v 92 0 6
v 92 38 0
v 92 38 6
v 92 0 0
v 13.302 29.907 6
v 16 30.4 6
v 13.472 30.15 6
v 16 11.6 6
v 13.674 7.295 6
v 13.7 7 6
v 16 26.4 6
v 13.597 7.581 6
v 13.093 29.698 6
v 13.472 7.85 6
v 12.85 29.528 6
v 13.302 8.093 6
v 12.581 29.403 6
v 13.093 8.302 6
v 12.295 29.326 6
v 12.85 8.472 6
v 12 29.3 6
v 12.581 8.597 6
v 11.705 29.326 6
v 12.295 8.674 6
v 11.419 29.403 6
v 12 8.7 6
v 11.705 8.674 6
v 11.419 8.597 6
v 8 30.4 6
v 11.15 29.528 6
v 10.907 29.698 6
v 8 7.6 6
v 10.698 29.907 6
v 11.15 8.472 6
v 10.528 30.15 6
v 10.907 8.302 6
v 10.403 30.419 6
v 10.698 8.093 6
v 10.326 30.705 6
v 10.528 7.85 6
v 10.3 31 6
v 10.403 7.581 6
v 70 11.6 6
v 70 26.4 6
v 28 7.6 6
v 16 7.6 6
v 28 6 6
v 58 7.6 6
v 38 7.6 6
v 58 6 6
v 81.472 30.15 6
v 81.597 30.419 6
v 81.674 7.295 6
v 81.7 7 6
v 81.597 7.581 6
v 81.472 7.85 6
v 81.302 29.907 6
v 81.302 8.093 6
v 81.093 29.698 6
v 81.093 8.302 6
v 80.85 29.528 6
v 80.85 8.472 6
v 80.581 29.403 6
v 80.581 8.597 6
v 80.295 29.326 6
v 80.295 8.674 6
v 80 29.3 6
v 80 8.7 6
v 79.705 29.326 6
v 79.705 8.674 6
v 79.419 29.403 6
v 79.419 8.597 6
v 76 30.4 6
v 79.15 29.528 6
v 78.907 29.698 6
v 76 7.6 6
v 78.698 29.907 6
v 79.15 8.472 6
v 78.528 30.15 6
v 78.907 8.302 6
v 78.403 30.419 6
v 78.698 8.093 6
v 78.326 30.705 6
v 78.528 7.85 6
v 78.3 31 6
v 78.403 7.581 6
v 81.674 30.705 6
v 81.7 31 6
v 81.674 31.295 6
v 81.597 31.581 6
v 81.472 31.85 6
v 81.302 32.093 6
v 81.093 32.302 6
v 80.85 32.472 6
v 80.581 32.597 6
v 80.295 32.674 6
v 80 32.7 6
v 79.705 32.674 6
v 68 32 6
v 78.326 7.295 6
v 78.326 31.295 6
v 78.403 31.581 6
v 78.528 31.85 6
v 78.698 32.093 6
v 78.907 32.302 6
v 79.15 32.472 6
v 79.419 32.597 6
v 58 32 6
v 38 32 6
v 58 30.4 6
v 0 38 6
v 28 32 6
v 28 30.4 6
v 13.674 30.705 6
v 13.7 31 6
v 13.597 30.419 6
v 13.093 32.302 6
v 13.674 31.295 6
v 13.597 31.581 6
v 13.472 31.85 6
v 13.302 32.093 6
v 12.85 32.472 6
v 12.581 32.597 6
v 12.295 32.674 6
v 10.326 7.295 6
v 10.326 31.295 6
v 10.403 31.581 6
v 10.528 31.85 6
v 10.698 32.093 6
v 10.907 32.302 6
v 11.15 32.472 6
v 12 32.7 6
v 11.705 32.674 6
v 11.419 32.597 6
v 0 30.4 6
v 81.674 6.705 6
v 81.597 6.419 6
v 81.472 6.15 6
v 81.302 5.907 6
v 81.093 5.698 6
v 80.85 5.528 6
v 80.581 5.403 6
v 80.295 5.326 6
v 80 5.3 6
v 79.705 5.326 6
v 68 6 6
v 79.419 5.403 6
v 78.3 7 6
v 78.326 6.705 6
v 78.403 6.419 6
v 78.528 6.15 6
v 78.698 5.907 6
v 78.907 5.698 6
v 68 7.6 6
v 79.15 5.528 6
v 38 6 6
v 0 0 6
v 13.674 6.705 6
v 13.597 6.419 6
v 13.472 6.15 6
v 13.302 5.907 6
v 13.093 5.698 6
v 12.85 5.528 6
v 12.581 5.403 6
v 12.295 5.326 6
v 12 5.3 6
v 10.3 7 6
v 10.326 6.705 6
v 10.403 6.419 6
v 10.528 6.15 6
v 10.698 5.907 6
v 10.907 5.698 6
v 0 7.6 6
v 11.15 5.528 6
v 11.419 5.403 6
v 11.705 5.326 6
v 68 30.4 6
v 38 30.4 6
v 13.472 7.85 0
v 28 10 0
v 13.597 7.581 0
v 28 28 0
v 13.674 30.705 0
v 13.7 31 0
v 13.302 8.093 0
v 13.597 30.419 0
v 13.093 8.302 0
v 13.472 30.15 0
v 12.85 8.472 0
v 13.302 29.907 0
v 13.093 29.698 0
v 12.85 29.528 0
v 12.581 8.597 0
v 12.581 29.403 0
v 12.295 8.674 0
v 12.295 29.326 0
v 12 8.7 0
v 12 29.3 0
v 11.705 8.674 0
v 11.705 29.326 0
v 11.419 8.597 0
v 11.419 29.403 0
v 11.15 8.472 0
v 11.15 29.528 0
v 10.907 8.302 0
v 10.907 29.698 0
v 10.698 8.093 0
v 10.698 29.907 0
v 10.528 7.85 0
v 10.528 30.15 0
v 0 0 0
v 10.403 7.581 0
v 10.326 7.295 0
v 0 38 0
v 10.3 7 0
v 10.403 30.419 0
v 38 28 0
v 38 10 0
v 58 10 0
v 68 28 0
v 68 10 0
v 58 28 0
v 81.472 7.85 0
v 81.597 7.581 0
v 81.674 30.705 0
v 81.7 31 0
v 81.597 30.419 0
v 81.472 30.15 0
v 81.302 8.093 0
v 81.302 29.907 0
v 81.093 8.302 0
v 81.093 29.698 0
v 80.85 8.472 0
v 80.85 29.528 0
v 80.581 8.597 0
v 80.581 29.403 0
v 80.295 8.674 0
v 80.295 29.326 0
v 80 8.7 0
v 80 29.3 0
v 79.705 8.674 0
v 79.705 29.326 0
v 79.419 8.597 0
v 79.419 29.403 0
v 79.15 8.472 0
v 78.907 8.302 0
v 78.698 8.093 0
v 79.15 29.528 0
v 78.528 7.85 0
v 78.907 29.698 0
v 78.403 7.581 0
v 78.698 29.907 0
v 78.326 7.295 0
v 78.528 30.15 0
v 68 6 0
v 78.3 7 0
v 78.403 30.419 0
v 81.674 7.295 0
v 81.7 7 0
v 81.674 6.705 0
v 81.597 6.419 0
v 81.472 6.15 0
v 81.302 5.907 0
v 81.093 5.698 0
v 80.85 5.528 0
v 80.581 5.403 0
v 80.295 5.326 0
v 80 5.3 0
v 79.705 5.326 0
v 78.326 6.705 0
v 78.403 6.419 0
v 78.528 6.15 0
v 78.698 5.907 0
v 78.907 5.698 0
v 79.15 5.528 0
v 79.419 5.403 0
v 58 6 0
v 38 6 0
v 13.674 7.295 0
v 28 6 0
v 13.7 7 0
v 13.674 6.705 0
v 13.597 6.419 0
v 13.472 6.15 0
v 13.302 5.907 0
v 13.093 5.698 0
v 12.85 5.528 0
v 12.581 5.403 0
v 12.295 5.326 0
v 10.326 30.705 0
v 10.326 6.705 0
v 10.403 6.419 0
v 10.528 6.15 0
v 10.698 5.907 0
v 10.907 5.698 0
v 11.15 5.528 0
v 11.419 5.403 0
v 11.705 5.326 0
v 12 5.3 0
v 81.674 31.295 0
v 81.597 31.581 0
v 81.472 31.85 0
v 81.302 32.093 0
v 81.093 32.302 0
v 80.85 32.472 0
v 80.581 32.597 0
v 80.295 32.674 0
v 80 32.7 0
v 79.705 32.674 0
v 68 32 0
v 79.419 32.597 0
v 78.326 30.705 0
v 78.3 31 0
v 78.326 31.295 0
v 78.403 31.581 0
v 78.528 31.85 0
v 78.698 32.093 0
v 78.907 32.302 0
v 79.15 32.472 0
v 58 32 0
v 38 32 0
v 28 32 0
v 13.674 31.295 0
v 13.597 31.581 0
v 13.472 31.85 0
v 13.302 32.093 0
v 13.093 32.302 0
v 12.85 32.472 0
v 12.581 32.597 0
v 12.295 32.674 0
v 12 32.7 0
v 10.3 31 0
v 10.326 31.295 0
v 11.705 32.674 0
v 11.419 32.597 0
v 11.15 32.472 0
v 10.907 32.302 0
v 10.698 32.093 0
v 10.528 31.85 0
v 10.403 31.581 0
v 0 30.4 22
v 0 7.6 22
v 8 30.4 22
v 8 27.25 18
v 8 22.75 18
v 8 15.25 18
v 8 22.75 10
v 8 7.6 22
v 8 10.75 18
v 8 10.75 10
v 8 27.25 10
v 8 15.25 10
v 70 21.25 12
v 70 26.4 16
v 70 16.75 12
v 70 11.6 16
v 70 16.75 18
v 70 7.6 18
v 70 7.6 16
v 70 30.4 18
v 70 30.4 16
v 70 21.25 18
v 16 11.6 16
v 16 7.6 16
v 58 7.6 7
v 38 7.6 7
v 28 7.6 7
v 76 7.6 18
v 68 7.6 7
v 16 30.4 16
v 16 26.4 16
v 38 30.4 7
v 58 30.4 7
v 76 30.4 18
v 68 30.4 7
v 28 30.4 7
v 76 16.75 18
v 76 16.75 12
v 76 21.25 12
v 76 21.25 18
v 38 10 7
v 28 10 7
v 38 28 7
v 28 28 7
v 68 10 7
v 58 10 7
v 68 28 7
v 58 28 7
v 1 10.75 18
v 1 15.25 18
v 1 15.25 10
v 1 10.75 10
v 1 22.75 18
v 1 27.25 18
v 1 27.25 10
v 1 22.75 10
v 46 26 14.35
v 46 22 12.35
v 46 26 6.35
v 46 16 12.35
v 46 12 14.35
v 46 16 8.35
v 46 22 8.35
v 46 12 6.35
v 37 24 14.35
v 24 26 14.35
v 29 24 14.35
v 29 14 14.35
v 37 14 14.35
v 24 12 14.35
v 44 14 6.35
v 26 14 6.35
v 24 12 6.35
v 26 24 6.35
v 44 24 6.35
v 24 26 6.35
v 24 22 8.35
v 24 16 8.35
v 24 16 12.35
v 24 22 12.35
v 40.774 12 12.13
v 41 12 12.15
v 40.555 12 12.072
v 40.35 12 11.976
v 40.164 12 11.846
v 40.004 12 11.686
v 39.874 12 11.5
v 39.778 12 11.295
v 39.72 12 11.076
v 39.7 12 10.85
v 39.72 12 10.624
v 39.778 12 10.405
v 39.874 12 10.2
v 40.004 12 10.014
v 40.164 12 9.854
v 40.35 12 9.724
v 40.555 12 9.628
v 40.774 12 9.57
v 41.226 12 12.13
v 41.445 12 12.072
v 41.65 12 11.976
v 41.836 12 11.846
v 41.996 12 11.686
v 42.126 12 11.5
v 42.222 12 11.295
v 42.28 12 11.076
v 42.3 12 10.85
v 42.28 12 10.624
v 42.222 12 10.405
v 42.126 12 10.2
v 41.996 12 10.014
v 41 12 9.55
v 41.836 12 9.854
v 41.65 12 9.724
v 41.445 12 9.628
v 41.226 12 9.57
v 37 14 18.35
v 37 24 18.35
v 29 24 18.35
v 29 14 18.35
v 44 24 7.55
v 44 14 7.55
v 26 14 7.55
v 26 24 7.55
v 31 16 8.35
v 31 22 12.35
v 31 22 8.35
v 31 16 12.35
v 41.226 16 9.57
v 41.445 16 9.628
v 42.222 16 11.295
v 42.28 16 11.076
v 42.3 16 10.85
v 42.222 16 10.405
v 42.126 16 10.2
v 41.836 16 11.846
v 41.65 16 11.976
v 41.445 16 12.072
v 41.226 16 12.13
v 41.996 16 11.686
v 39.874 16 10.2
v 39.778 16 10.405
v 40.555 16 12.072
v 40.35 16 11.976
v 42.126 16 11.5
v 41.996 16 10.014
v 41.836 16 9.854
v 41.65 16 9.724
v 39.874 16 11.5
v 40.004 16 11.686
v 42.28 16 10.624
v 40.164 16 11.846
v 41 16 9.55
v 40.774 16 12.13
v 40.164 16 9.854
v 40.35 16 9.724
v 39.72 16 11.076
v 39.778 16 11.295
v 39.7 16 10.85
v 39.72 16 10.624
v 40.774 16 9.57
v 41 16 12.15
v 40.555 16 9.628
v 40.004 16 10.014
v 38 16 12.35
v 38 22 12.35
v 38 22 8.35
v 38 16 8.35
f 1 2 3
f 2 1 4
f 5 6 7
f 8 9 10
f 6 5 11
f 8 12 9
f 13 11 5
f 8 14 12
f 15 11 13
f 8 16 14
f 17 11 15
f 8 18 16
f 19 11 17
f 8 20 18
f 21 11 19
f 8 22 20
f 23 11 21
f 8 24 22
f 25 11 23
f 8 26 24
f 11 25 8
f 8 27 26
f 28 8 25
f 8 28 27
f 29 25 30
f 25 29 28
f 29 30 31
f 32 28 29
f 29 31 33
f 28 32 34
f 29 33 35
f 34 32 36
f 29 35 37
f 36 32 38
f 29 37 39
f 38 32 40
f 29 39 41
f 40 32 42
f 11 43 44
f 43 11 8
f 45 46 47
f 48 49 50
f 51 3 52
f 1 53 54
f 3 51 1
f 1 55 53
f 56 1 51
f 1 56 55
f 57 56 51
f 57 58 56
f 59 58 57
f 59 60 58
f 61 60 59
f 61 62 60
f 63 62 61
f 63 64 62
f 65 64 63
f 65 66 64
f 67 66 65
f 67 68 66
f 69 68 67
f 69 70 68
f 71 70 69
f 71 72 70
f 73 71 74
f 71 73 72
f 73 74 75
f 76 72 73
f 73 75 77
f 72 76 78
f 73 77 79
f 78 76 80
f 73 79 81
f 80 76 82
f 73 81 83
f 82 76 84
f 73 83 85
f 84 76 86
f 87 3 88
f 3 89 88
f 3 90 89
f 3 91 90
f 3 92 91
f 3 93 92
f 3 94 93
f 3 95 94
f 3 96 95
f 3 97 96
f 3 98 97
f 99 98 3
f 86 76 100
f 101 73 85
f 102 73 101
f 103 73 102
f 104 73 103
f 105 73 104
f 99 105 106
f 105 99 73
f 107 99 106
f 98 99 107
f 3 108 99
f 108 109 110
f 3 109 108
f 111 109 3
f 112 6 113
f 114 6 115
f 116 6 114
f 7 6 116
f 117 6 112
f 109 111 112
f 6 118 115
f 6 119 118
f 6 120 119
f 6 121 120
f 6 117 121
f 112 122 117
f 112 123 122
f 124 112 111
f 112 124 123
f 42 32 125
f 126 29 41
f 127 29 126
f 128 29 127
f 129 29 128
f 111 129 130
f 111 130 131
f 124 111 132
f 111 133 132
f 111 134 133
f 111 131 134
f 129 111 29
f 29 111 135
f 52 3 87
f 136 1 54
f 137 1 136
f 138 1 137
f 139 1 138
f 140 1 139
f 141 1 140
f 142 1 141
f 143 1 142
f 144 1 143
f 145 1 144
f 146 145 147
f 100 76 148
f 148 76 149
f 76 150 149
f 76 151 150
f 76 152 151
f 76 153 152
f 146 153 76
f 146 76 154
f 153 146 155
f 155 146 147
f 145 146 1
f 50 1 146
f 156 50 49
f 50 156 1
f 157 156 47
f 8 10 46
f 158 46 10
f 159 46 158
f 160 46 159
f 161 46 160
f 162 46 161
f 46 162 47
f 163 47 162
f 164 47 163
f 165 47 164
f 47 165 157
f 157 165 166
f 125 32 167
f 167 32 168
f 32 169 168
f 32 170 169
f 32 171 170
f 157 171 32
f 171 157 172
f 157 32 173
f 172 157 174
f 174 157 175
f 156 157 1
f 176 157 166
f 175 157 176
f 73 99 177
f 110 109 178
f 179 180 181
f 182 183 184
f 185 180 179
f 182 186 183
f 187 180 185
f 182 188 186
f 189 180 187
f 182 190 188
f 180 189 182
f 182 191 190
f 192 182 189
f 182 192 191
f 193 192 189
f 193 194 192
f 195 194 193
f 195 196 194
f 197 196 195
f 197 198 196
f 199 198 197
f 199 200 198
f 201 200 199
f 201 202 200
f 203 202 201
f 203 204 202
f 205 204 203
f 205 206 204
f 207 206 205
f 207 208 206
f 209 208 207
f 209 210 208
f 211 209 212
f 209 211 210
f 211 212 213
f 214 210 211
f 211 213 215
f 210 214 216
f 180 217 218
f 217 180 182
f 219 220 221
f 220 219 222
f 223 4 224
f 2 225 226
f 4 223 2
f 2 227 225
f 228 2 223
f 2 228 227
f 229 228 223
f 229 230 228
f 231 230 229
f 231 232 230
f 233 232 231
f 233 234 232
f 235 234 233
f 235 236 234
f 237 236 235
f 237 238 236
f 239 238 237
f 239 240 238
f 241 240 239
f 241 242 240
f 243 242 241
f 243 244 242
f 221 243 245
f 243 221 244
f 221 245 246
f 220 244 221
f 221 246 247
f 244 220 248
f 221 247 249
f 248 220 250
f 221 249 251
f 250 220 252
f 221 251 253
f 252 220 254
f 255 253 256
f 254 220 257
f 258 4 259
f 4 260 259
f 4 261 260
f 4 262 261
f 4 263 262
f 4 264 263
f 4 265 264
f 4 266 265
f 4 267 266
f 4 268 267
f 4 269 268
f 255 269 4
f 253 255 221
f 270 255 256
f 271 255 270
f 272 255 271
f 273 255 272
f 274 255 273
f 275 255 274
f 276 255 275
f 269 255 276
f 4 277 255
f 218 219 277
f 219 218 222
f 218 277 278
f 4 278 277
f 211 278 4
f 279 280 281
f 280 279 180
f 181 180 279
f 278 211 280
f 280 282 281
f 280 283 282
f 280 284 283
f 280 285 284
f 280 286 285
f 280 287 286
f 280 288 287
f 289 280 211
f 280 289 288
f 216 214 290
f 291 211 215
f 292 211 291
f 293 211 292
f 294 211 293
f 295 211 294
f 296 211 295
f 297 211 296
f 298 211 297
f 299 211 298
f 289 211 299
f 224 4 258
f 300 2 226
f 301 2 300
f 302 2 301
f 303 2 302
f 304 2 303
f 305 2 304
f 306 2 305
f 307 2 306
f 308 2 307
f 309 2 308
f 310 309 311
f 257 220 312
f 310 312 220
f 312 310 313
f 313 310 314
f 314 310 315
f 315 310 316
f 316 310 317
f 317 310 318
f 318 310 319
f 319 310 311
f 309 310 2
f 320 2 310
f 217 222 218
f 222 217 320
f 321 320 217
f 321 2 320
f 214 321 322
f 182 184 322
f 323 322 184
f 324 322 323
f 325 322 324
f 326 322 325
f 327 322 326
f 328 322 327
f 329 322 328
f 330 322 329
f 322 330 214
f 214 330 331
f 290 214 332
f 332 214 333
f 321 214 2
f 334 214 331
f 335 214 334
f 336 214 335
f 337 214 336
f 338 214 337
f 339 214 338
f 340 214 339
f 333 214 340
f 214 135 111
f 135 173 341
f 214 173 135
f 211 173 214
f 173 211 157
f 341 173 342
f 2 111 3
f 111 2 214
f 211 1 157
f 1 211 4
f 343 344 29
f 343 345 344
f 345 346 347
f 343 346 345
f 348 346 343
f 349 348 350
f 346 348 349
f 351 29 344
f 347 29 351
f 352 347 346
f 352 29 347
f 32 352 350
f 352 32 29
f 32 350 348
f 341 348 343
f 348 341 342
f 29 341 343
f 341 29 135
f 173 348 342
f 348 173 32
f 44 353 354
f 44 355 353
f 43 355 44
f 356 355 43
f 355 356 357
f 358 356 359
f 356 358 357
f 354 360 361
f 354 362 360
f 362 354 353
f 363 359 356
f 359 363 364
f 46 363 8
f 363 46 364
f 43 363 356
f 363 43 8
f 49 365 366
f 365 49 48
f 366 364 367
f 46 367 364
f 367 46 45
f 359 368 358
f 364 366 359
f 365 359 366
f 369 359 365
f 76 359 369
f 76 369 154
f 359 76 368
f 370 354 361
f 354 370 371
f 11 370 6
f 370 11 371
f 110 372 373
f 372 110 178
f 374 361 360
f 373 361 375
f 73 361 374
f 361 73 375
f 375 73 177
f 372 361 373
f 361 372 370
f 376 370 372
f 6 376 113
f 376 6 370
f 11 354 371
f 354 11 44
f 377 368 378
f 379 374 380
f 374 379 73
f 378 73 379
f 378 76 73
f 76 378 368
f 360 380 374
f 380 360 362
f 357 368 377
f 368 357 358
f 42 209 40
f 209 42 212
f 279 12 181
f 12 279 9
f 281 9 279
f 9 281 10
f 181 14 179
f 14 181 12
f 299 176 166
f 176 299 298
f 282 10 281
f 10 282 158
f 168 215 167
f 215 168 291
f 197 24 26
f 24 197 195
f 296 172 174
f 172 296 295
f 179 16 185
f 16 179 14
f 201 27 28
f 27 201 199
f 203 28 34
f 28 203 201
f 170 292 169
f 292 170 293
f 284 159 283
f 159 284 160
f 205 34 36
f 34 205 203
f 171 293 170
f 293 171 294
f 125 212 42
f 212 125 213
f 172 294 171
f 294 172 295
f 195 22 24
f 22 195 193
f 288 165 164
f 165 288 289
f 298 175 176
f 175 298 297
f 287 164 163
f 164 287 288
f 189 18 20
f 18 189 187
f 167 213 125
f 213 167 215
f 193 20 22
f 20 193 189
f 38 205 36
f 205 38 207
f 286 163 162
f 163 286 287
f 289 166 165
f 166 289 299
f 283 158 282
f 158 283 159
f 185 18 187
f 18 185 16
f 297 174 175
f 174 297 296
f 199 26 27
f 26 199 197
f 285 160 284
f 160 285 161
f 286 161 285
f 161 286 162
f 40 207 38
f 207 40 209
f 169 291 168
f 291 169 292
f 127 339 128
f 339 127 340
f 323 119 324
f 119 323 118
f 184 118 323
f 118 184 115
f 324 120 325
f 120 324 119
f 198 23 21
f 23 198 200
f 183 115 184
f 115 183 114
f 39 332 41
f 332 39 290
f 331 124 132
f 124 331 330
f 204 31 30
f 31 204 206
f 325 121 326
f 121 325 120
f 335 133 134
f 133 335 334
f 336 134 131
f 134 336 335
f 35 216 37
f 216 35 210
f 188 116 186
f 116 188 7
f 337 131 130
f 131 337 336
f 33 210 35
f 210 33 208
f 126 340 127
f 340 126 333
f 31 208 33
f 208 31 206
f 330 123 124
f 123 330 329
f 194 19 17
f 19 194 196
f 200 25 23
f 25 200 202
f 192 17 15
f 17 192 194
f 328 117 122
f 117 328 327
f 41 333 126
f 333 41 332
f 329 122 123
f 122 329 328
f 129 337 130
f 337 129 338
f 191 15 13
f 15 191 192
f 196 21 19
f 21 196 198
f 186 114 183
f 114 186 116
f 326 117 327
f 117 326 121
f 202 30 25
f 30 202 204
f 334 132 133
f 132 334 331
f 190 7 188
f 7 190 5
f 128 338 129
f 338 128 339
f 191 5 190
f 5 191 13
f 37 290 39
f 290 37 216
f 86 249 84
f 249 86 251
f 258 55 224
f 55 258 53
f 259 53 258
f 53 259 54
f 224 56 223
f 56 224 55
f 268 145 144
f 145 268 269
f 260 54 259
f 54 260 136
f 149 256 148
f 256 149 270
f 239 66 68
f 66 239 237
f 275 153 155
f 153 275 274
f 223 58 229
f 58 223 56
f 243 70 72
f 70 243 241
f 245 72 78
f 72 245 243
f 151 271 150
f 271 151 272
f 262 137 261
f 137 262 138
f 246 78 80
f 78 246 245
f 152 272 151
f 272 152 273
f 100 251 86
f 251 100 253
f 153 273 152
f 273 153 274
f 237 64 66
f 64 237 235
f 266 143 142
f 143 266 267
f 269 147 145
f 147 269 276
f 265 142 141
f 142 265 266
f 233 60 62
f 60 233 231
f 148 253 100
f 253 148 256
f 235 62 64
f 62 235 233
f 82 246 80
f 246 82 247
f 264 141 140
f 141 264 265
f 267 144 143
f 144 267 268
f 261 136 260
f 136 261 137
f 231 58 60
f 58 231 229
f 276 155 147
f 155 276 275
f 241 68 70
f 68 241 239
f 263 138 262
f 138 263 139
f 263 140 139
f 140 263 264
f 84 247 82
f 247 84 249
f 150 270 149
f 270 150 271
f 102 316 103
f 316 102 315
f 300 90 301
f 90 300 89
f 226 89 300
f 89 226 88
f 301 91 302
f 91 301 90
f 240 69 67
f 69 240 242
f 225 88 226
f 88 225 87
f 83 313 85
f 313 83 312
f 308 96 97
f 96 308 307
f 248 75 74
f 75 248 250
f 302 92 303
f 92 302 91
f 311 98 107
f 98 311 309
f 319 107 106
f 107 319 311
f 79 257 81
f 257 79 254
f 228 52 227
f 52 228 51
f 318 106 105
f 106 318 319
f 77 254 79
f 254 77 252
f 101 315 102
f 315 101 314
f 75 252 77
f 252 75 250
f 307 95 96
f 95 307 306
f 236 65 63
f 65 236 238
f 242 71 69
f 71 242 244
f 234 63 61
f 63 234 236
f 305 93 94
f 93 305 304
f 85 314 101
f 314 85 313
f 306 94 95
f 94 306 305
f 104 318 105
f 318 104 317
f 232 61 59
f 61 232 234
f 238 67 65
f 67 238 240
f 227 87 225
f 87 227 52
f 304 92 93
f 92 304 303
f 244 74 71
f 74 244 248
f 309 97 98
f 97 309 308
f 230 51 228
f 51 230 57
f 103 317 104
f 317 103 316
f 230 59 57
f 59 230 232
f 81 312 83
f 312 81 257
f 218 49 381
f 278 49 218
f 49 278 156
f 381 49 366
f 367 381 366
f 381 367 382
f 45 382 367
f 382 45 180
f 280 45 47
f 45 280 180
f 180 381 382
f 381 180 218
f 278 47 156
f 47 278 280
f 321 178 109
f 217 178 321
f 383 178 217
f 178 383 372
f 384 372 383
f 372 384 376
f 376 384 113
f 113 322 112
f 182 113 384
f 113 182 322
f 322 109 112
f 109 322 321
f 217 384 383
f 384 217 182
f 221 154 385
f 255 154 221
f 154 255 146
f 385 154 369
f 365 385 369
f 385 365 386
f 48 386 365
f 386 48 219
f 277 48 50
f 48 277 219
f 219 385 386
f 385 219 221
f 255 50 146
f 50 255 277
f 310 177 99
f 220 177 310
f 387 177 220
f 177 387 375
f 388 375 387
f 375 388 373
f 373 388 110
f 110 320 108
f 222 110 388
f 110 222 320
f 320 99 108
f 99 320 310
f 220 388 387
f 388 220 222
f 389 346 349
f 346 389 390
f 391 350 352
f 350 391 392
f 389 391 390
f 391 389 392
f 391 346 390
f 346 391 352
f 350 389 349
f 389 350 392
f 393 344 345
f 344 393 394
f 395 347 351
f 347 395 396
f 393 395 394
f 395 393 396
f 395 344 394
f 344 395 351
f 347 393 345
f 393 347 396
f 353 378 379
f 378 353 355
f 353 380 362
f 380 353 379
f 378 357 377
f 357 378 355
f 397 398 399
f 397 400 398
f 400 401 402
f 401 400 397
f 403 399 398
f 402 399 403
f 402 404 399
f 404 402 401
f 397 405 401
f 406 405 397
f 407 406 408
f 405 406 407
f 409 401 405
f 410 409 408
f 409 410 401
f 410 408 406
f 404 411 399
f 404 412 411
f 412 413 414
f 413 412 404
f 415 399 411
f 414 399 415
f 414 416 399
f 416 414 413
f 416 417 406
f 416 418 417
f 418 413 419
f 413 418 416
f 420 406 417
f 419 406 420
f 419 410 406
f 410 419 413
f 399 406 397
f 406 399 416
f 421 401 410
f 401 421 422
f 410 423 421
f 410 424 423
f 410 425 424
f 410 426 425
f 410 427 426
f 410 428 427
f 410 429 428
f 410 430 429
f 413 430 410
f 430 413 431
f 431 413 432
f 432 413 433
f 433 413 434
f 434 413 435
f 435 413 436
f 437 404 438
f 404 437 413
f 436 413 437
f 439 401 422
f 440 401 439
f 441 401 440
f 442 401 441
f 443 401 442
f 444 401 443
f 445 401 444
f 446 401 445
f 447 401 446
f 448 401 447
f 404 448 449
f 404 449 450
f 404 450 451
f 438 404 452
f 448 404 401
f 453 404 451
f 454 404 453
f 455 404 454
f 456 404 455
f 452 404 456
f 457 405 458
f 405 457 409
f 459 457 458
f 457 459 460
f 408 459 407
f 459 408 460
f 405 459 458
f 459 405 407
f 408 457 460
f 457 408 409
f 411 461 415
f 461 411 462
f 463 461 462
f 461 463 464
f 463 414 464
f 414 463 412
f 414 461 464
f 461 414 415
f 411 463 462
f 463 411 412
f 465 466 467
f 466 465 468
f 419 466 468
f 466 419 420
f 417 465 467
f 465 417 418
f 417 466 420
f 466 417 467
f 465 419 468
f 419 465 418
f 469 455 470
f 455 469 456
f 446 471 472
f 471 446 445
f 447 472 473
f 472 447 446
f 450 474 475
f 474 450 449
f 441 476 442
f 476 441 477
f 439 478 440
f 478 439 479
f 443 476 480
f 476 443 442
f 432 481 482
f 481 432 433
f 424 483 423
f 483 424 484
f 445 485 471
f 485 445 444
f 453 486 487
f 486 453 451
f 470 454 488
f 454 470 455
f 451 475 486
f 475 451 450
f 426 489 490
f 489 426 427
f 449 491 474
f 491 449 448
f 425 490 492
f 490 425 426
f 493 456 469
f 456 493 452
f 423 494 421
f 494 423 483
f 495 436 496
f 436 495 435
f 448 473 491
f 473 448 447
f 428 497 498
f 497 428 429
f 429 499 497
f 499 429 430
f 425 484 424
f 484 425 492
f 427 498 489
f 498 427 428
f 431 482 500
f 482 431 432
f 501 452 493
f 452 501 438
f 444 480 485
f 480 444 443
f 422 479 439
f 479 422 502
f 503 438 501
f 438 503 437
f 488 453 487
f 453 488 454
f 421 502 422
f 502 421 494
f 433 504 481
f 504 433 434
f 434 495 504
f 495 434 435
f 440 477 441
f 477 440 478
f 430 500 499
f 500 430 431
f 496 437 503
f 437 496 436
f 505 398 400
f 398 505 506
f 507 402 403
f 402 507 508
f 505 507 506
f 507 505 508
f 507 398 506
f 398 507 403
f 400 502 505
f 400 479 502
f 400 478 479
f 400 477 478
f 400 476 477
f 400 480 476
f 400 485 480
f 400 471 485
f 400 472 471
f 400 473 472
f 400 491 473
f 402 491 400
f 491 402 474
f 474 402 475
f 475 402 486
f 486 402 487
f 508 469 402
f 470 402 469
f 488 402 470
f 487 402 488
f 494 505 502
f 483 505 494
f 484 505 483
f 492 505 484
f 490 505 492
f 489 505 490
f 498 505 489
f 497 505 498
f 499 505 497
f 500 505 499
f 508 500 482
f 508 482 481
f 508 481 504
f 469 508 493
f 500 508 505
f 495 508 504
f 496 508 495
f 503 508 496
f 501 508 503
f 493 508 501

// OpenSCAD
/*
Bench mechanism v3

Purpose:
- smaller and cheaper than v2
- safer and simpler than a wearable shell
- built for a library or print-shop first run
- designed around M3 hardware and elastic-band testing

Part selector:
- part = 0 -> assembly preview
- part = 1 -> base
- part = 2 -> carriage
- part = 3 -> M3 test block
*/

$fn = 36;

part = 0;
eps = 0.05;

// --- Hardware baseline ------------------------------------------------------
// M3 clearance hole for screws that should pass through without tapping.
m3_clearance_d = 3.4;
// M3 insert bore for optional heat-set inserts in a future shell or fixture.
m3_insert_bore_d = 4.6;
// Across-flats dimension for a standard M3 hex nut trap.
m3_nut_flat = 5.7;
// Nut trap depth for a standard M3 nut.
m3_nut_depth = 2.6;

// --- Print / fit tuning -----------------------------------------------------
// Side clearance per rail face. Generous for cheap PLA service prints.
side_clearance = 0.40;
// Vertical clearance keeps the carriage from scraping the base immediately.
vertical_clearance = 0.35;

// --- Base dimensions --------------------------------------------------------
// Overall base length kept under 100 mm to stay cheap at a print shop.
base_length = 92;
// Overall base width kept narrow but still wide enough for stable taping.
base_width = 38;
// Flat plate thickness for stiffness without wasting plastic.
base_thickness = 6;

// Rail run starts after the rear bridge so the carriage has a hard back stop.
rail_start = 16;
// Rail length is short on purpose to limit print size and travel distance.
rail_length = 54;
// Rail thickness is chunky enough to survive repeated beginner handling.
rail_thickness = 4;
// Rail height is tall enough to guide the carriage without toppling.
rail_height = 10;

// Carriage width is the moving body width before clearances are added.
carriage_width = 14;
// Channel width is the free space between rails.
channel_width = carriage_width + side_clearance * 2;
// Outer guide span includes both rails.
function guide_outer_width() = channel_width + rail_thickness * 2;

// Rear bridge creates the back stop and elastic anchor wall.
rear_bridge_length = 8;
rear_bridge_height = 16;
// Elastic slots fit common office rubber bands or light elastic cord.
elastic_slot_w = 4.5;
elastic_slot_h = 8;
elastic_slot_spacing = 12;

// Front stop limits travel and keeps the tether centered.
front_stop_length = 6;
front_stop_height = 12;
// Open notch is intentionally top-open to avoid closed-hole manifold issues.
front_notch_w = 4.5;
front_notch_d = 6;

// M3 mounting holes let the base screw onto scrap wood or plastic if needed.
mount_hole_offset_x = 12;
mount_hole_offset_y = 7;

// Tie-down slots are backup mounting points for tape or zip ties.
tie_slot_len = 10;
tie_slot_w = 4;

// --- Carriage dimensions ----------------------------------------------------
// Carriage is short to keep mass low and elastic response predictable.
carriage_length = 22;
// Carriage body height before finger tab.
carriage_height = 8;
// Bottom relief reduces contact area and friction on cheap prints.
carriage_relief_depth = 1.2;
// Rear slot captures the elastic loop or tied cord.
carriage_elastic_slot_len = 7;
carriage_elastic_slot_w = 6;
carriage_elastic_slot_h = 4;
// Front tether hole for line or string attachment.
tether_hole_d = 2.6;
// Front soft-tip pocket gives tape or foam a repeatable landing spot.
tip_slot_len = 8;
tip_slot_w = 6;
tip_slot_h = 4;

module m3_hole(h) {
    cylinder(h = h, d = m3_clearance_d);
}

module hex_nut_cut(depth) {
    cylinder(h = depth, d = m3_nut_flat / 0.8660254, $fn = 6);
}

module base_module() {
    difference() {
        union() {
            cube([base_length, base_width, base_thickness]);

            // Rear bridge is the hard back stop and elastic anchor structure.
            translate([0, (base_width - guide_outer_width()) / 2, base_thickness - eps])
                cube([rear_bridge_length, guide_outer_width(), rear_bridge_height + eps]);

            // Left rail guides the carriage and overlaps the plate slightly.
            translate([rail_start, (base_width - guide_outer_width()) / 2, base_thickness - eps])
                cube([rail_length, rail_thickness, rail_height + eps]);

            // Right rail mirrors the left rail with the same overlap trick.
            translate([rail_start, (base_width + channel_width) / 2, base_thickness - eps])
                cube([rail_length, rail_thickness, rail_height + eps]);

            // Front stop is a simple rectangular bumper to avoid fragile tips.
            translate([rail_start + rail_length, (base_width - guide_outer_width()) / 2, base_thickness - eps])
                cube([front_stop_length, guide_outer_width(), front_stop_height + eps]);
        }

        // M3 mounting holes for a rigid test fixture.
        translate([mount_hole_offset_x, mount_hole_offset_y, -1]) m3_hole(base_thickness + 2);
        translate([mount_hole_offset_x, base_width - mount_hole_offset_y, -1]) m3_hole(base_thickness + 2);
        translate([base_length - mount_hole_offset_x, mount_hole_offset_y, -1]) m3_hole(base_thickness + 2);
        translate([base_length - mount_hole_offset_x, base_width - mount_hole_offset_y, -1]) m3_hole(base_thickness + 2);

        // Tie slots let you mount the base even if you have zero screws on day one.
        translate([28, 6, -1]) cube([tie_slot_len, tie_slot_w, base_thickness + 2]);
        translate([28, base_width - 10, -1]) cube([tie_slot_len, tie_slot_w, base_thickness + 2]);
        translate([58, 6, -1]) cube([tie_slot_len, tie_slot_w, base_thickness + 2]);
        translate([58, base_width - 10, -1]) cube([tie_slot_len, tie_slot_w, base_thickness + 2]);

        // Dual elastic slots keep the pull centered and reduce twist.
        translate([1, base_width / 2 - elastic_slot_spacing / 2 - elastic_slot_w / 2, base_thickness + 4])
            cube([rear_bridge_length + 2, elastic_slot_w, elastic_slot_h]);
        translate([1, base_width / 2 + elastic_slot_spacing / 2 - elastic_slot_w / 2, base_thickness + 4])
            cube([rear_bridge_length + 2, elastic_slot_w, elastic_slot_h]);

        // Open top notch guides the string without creating a closed tunnel.
        translate([rail_start + rail_length, base_width / 2 - front_notch_w / 2, base_thickness + front_stop_height - front_notch_d])
            cube([front_stop_length + 1, front_notch_w, front_notch_d + 1]);
    }
}

module carriage_module() {
    difference() {
        union() {
            cube([carriage_length, carriage_width, carriage_height]);

            // Finger tab helps manual pull-back tests without needing a tool.
            translate([5, carriage_width / 2 - 5, carriage_height - eps])
                cube([8, 10, 4 + eps]);
        }

        // Bottom relief cuts drag and gives cheap prints a better chance to slide.
        translate([2, 2, -1])
            cube([carriage_length - 4, carriage_width - 4, carriage_relief_depth + 1]);

        // Rear elastic capture slot is open to the back for fast re-threading.
        translate([-1, carriage_width / 2 - carriage_elastic_slot_w / 2, carriage_height / 2 - carriage_elastic_slot_h / 2])
            cube([carriage_elastic_slot_len + 1, carriage_elastic_slot_w, carriage_elastic_slot_h]);

        // Front horizontal tether hole for string or line.
        translate([carriage_length - 5, carriage_width / 2, carriage_height / 2 + 0.5])
            rotate([90, 0, 0]) cylinder(h = carriage_width + 2, d = tether_hole_d);

        // Tip slot is open at the front so foam or a suction cup stem can be inserted directly.
        translate([carriage_length - tip_slot_len, carriage_width / 2 - tip_slot_w / 2, carriage_height / 2 - tip_slot_h / 2])
            cube([tip_slot_len + 1, tip_slot_w, tip_slot_h]);
    }
}

module m3_test_block() {
    difference() {
        cube([24, 18, 6]);

        // M3 clearance hole test.
        translate([6, 9, -1]) cylinder(h = 8, d = m3_clearance_d);

        // M3 insert bore test.
        translate([12, 9, -1]) cylinder(h = 8, d = m3_insert_bore_d);

        // M3 screw + nut trap test for cheap print-shop tolerances.
        translate([18, 9, -1]) cylinder(h = 8, d = m3_clearance_d);
        translate([18, 9, 6 - m3_nut_depth]) hex_nut_cut(m3_nut_depth + 1);
    }
}

module assembly_preview() {
    color("lightgray") base_module();
    translate([rail_start + 8, (base_width - carriage_width) / 2, base_thickness + vertical_clearance])
        color("orange") carriage_module();
}

if (part == 1) {
    base_module();
} else if (part == 2) {
    carriage_module();
} else if (part == 3) {
    m3_test_block();
} else {
    assembly_preview();
}
